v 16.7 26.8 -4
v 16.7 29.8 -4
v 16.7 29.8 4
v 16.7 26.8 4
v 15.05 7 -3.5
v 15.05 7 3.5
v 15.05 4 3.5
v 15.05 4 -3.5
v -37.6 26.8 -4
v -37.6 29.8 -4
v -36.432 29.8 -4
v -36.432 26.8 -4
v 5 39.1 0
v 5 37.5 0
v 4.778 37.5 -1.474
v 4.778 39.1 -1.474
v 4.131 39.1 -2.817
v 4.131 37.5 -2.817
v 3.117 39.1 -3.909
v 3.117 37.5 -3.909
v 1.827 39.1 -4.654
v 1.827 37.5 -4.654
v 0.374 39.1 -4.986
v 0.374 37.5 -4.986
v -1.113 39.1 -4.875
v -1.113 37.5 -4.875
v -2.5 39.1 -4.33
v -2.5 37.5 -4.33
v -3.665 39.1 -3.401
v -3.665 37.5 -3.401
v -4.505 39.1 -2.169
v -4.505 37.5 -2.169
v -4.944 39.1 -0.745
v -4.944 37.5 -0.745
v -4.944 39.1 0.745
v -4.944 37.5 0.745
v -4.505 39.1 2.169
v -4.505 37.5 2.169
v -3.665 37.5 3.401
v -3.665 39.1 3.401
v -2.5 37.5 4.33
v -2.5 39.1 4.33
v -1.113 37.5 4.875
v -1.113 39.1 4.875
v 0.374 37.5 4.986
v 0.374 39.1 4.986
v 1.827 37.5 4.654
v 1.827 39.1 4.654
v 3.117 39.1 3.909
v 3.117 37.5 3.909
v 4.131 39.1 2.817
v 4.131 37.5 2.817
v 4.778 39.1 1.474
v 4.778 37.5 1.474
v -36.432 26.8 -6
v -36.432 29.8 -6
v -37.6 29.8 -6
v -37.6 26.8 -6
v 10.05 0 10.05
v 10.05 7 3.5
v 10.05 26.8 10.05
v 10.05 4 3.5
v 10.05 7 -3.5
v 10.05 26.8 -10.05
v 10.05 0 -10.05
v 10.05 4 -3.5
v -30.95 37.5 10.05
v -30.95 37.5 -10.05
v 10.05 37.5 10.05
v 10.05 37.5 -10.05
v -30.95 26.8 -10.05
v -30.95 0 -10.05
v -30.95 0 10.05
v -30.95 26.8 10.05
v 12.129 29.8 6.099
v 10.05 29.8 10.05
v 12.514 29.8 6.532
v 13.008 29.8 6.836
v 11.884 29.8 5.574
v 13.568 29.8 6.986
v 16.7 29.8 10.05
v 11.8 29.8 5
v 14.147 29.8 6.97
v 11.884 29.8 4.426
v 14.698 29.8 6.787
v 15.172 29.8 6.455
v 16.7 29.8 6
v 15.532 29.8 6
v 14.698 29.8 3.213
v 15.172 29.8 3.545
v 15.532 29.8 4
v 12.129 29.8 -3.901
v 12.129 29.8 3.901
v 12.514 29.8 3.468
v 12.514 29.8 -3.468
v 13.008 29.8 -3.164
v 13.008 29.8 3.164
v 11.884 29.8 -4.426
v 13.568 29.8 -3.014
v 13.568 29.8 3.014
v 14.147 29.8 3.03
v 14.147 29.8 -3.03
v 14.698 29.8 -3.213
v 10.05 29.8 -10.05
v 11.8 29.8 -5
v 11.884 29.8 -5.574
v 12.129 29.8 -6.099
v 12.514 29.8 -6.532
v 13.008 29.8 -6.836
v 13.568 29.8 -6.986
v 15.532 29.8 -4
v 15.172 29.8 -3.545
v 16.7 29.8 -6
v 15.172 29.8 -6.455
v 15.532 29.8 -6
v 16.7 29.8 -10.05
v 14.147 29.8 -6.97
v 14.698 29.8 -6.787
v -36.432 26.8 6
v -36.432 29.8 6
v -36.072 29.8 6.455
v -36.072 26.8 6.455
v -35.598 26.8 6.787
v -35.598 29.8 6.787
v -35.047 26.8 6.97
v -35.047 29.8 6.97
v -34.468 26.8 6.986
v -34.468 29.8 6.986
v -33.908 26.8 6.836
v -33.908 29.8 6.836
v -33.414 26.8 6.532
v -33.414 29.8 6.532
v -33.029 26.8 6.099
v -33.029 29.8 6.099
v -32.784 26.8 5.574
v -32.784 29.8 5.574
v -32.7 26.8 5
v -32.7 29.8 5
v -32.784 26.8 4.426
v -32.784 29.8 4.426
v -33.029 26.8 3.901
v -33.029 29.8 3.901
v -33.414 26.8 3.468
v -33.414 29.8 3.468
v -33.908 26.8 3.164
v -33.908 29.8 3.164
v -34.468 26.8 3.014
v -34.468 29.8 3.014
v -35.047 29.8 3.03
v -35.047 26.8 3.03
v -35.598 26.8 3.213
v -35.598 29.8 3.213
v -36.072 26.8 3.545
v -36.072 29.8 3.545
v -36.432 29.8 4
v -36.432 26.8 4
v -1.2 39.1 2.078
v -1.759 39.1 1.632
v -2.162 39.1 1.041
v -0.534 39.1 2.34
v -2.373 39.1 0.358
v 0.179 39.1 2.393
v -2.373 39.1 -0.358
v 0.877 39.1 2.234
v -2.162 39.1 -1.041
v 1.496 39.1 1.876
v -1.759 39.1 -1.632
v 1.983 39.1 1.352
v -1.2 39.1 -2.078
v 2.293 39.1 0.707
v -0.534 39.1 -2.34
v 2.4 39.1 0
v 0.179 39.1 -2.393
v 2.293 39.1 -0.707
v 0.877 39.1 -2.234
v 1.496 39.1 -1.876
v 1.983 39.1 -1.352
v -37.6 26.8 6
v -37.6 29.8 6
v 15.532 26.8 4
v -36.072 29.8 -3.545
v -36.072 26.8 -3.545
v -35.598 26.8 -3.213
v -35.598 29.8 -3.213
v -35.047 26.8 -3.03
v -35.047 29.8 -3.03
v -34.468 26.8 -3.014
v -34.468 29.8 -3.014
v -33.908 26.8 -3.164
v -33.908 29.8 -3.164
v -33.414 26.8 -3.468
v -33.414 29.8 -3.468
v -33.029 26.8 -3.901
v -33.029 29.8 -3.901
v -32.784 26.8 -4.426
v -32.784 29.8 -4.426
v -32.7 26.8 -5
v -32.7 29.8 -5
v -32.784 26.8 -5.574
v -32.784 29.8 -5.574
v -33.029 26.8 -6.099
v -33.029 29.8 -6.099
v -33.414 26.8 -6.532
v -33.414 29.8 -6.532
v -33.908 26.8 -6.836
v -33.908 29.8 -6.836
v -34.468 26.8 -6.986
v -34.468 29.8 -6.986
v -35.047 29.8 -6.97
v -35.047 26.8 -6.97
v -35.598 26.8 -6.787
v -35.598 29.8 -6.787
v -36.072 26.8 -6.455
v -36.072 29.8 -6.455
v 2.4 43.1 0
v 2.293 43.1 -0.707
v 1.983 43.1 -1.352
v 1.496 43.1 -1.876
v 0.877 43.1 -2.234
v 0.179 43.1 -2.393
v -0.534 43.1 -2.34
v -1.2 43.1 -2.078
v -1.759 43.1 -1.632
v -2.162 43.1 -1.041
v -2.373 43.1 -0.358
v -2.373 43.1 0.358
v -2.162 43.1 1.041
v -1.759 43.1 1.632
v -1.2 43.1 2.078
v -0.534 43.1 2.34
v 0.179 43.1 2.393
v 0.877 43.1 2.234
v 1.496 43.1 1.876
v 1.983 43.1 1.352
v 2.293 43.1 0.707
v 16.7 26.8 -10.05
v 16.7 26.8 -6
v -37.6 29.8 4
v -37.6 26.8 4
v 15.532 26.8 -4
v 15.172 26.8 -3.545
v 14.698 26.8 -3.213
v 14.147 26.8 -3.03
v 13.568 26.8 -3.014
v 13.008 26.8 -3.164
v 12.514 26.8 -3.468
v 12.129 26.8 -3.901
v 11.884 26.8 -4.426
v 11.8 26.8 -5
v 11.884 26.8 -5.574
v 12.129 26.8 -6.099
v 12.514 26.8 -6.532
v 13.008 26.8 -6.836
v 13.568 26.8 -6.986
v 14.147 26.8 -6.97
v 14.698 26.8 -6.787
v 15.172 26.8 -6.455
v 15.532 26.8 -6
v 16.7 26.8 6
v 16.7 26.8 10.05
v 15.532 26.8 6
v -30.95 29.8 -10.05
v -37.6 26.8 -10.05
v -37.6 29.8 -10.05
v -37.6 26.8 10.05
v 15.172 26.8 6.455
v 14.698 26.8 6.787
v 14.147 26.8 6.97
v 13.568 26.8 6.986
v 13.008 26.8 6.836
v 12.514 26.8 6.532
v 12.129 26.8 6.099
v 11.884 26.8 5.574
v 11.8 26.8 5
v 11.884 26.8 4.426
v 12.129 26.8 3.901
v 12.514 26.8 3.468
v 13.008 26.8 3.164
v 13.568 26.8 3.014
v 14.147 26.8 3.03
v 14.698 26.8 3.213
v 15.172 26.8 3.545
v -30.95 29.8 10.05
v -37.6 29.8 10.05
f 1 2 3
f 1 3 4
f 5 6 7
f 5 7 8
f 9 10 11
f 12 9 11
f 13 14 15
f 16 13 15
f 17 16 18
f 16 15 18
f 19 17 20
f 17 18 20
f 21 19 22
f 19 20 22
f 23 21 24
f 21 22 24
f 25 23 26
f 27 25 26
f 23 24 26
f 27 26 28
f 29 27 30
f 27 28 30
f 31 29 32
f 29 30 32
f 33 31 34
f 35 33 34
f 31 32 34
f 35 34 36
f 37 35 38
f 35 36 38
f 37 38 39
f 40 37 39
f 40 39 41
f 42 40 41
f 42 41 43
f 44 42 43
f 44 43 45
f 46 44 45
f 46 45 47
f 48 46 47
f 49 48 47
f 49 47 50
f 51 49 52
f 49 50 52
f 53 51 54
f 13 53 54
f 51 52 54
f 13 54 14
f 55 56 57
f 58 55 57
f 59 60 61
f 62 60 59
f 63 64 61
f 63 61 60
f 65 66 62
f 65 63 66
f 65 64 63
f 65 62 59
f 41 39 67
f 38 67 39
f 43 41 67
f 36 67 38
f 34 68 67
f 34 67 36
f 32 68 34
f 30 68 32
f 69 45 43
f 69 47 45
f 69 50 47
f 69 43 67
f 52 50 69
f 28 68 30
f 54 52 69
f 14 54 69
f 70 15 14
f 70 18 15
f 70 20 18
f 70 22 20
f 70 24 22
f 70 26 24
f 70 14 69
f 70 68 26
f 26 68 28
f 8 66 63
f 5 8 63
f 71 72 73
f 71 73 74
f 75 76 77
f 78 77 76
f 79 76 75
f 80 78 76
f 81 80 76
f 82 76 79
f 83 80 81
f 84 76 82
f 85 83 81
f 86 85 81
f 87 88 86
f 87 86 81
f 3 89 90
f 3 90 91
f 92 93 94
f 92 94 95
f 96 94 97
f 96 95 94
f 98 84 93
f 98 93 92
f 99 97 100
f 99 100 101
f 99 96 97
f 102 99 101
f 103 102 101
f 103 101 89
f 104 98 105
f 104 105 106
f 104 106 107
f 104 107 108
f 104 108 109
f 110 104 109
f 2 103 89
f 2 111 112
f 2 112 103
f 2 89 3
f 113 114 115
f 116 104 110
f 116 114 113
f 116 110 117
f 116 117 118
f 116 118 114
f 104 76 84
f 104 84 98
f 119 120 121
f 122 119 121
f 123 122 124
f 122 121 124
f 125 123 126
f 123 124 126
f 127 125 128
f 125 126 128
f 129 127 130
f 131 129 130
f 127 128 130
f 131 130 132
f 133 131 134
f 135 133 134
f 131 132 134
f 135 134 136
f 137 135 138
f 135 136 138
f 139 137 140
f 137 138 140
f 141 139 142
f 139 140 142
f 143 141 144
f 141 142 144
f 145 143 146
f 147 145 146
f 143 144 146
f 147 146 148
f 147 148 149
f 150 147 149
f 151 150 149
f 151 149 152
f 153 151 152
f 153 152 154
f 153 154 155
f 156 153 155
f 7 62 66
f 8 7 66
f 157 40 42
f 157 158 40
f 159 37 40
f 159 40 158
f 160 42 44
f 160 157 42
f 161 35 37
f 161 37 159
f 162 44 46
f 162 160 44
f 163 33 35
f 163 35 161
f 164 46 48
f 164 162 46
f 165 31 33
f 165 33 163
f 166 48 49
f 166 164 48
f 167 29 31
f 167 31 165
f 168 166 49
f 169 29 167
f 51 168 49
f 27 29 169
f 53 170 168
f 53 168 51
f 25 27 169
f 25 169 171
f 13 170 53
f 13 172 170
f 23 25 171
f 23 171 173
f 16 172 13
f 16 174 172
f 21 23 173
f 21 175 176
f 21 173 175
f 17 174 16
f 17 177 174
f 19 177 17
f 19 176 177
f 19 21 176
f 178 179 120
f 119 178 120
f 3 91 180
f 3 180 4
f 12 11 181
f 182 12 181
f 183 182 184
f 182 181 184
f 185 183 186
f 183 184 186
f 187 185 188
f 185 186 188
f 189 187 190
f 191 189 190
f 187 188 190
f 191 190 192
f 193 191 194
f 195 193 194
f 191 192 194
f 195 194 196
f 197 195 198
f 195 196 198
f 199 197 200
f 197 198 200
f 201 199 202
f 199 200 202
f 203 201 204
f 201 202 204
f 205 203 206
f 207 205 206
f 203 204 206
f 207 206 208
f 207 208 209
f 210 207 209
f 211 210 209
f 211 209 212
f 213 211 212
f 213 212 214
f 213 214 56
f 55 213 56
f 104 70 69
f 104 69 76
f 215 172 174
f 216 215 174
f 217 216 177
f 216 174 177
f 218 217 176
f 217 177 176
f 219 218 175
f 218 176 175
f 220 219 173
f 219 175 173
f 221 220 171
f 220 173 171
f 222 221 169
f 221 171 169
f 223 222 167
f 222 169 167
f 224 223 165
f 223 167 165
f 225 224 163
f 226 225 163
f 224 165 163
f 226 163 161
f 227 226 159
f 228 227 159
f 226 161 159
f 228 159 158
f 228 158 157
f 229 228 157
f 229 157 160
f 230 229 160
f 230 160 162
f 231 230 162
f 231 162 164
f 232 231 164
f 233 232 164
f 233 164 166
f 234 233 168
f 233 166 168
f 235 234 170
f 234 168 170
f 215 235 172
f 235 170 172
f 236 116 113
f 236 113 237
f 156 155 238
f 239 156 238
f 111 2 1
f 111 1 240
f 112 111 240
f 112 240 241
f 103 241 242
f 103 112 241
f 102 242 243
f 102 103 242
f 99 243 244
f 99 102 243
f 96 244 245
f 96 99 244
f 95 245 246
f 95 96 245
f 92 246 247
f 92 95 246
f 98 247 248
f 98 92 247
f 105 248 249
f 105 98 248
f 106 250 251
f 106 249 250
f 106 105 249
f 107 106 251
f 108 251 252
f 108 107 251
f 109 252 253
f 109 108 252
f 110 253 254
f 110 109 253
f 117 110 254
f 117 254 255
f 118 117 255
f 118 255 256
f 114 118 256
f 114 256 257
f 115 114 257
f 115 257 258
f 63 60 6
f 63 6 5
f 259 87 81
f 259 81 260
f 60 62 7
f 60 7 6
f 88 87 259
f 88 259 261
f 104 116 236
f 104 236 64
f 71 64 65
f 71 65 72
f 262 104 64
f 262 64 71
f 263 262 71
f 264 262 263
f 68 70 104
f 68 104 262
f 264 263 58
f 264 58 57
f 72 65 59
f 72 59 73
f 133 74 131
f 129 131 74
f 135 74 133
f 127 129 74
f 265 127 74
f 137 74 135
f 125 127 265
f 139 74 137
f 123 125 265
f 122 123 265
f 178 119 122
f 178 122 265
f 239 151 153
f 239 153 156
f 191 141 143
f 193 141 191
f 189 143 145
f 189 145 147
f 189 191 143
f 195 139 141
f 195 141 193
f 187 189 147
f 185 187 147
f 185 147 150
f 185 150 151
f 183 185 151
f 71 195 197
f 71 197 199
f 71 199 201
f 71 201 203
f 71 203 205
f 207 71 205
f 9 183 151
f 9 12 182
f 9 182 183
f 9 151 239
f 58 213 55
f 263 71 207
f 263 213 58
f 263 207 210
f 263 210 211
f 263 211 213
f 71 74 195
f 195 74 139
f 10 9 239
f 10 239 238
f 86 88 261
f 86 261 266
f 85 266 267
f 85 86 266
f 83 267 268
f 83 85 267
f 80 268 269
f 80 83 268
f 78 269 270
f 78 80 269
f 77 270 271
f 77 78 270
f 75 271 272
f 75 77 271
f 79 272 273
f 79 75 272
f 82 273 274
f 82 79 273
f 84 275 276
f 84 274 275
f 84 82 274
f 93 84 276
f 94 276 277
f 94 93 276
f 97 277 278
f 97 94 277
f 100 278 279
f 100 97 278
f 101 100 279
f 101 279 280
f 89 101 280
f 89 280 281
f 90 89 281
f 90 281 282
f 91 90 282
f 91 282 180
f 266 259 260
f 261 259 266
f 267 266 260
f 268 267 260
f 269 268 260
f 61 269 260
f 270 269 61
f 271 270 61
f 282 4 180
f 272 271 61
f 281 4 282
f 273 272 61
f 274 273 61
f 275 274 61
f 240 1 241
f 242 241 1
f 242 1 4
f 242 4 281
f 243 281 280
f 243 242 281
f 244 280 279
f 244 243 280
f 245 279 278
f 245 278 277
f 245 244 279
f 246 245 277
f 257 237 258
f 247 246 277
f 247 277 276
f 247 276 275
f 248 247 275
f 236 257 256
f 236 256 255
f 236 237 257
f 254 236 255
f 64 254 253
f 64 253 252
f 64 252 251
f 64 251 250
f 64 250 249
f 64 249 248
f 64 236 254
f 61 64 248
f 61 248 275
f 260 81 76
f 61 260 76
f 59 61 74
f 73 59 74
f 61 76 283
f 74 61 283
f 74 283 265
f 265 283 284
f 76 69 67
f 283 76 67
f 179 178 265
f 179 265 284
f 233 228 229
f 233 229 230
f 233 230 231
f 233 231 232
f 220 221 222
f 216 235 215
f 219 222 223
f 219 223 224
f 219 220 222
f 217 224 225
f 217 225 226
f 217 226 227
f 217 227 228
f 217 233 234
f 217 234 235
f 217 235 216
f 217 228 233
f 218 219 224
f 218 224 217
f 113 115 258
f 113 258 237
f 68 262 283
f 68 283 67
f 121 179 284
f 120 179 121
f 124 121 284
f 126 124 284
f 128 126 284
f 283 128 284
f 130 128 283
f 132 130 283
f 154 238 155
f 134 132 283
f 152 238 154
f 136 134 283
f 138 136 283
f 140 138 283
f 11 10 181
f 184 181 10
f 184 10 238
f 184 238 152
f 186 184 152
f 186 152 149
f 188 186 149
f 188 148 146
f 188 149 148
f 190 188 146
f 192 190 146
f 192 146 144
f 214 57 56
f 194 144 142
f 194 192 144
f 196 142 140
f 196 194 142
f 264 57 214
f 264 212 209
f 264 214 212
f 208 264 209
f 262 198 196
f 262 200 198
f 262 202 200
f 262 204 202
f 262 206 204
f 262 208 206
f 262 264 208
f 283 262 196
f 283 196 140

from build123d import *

# Parameters (mm, degrees)
BOSS_EXTRUDE1_START = -10.05
BOSS_EXTRUDE1_DEPTH = 20.1
CUT_EXTRUDE1_DEPTH  = 30.8
SKETCH5_R           = 5
BOSS_EXTRUDE2_DEPTH = 1.6
SKETCH6_R           = 2.4
BOSS_EXTRUDE3_DEPTH = 4
SKETCH8_W           = 7
SKETCH8_H           = 3
BOSS_EXTRUDE4_DEPTH = 5


with BuildPart() as part:
    # Sketch3 → Boss-Extrude1 (new body)
    with BuildSketch(Plane.XY.offset(BOSS_EXTRUDE1_START)):
        Polygon((-30.95, 0), (-30.95, 26.8), (-37.6, 26.8), (-37.6, 29.8), (-30.95, 29.8), (-30.95, 37.5), (10.05, 37.5), (10.05, 29.8), (16.7, 29.8), (16.7, 26.8), (10.05, 26.8), (10.05, 0), align=None)
    extrude(amount=BOSS_EXTRUDE1_DEPTH)

    # Sketch4 → Cut-Extrude1 (cut, through all)
    with BuildSketch(Plane(origin=(0, 29.8, 0), x_dir=(1, 0, 0), z_dir=(0, 1, 0))):
        with BuildLine():
            Line((-37.6, 6), (-37.6, 4))
            Line((-37.6, 4), (-36.432050808, 4))
            ThreePointArc((-36.432050808, 4), (-32.7, 5), (-36.432050808, 6))
            Line((-36.432050808, 6), (-37.6, 6))
        make_face()
        with BuildLine():
            Line((16.7, -6), (15.532050808, -6))
            ThreePointArc((15.532050808, -6), (11.8, -5), (15.532050808, -4))
            Line((15.532050808, -4), (16.7, -4))
            Line((16.7, -4), (16.7, -6))
        make_face()
        with BuildLine():
            Line((-37.6, -4), (-37.6, -6))
            Line((-37.6, -6), (-36.432050808, -6))
            ThreePointArc((-36.432050808, -6), (-32.7, -5), (-36.432050808, -4))
            Line((-36.432050808, -4), (-37.6, -4))
        make_face()
        with BuildLine():
            Line((16.7, 4), (15.532050808, 4))
            ThreePointArc((15.532050808, 4), (11.8, 5), (15.532050808, 6))
            Line((15.532050808, 6), (16.7, 6))
            Line((16.7, 6), (16.7, 4))
        make_face()
    extrude(amount=-CUT_EXTRUDE1_DEPTH, mode=Mode.SUBTRACT)

    # Sketch5 → Boss-Extrude2 (add)
    with BuildSketch(Plane(origin=(0, 37.5, 0), x_dir=(1, 0, 0), z_dir=(0, 1, 0))):
        Circle(SKETCH5_R)
    extrude(amount=BOSS_EXTRUDE2_DEPTH)

    # Sketch6 → Boss-Extrude3 (add)
    with BuildSketch(Plane(origin=(0, 39.1, 0), x_dir=(1, 0, 0), z_dir=(0, 1, 0))):
        Circle(SKETCH6_R)
    extrude(amount=BOSS_EXTRUDE3_DEPTH)

    # Sketch8 → Boss-Extrude4 (add)
    with BuildSketch(Plane(origin=(10.05, 0, 0), x_dir=(0, 0, -1), z_dir=(1, 0, 0))):
        with Locations((0, 5.5)):
            Rectangle(SKETCH8_W, SKETCH8_H)
    extrude(amount=BOSS_EXTRUDE4_DEPTH)


solid = part.part
